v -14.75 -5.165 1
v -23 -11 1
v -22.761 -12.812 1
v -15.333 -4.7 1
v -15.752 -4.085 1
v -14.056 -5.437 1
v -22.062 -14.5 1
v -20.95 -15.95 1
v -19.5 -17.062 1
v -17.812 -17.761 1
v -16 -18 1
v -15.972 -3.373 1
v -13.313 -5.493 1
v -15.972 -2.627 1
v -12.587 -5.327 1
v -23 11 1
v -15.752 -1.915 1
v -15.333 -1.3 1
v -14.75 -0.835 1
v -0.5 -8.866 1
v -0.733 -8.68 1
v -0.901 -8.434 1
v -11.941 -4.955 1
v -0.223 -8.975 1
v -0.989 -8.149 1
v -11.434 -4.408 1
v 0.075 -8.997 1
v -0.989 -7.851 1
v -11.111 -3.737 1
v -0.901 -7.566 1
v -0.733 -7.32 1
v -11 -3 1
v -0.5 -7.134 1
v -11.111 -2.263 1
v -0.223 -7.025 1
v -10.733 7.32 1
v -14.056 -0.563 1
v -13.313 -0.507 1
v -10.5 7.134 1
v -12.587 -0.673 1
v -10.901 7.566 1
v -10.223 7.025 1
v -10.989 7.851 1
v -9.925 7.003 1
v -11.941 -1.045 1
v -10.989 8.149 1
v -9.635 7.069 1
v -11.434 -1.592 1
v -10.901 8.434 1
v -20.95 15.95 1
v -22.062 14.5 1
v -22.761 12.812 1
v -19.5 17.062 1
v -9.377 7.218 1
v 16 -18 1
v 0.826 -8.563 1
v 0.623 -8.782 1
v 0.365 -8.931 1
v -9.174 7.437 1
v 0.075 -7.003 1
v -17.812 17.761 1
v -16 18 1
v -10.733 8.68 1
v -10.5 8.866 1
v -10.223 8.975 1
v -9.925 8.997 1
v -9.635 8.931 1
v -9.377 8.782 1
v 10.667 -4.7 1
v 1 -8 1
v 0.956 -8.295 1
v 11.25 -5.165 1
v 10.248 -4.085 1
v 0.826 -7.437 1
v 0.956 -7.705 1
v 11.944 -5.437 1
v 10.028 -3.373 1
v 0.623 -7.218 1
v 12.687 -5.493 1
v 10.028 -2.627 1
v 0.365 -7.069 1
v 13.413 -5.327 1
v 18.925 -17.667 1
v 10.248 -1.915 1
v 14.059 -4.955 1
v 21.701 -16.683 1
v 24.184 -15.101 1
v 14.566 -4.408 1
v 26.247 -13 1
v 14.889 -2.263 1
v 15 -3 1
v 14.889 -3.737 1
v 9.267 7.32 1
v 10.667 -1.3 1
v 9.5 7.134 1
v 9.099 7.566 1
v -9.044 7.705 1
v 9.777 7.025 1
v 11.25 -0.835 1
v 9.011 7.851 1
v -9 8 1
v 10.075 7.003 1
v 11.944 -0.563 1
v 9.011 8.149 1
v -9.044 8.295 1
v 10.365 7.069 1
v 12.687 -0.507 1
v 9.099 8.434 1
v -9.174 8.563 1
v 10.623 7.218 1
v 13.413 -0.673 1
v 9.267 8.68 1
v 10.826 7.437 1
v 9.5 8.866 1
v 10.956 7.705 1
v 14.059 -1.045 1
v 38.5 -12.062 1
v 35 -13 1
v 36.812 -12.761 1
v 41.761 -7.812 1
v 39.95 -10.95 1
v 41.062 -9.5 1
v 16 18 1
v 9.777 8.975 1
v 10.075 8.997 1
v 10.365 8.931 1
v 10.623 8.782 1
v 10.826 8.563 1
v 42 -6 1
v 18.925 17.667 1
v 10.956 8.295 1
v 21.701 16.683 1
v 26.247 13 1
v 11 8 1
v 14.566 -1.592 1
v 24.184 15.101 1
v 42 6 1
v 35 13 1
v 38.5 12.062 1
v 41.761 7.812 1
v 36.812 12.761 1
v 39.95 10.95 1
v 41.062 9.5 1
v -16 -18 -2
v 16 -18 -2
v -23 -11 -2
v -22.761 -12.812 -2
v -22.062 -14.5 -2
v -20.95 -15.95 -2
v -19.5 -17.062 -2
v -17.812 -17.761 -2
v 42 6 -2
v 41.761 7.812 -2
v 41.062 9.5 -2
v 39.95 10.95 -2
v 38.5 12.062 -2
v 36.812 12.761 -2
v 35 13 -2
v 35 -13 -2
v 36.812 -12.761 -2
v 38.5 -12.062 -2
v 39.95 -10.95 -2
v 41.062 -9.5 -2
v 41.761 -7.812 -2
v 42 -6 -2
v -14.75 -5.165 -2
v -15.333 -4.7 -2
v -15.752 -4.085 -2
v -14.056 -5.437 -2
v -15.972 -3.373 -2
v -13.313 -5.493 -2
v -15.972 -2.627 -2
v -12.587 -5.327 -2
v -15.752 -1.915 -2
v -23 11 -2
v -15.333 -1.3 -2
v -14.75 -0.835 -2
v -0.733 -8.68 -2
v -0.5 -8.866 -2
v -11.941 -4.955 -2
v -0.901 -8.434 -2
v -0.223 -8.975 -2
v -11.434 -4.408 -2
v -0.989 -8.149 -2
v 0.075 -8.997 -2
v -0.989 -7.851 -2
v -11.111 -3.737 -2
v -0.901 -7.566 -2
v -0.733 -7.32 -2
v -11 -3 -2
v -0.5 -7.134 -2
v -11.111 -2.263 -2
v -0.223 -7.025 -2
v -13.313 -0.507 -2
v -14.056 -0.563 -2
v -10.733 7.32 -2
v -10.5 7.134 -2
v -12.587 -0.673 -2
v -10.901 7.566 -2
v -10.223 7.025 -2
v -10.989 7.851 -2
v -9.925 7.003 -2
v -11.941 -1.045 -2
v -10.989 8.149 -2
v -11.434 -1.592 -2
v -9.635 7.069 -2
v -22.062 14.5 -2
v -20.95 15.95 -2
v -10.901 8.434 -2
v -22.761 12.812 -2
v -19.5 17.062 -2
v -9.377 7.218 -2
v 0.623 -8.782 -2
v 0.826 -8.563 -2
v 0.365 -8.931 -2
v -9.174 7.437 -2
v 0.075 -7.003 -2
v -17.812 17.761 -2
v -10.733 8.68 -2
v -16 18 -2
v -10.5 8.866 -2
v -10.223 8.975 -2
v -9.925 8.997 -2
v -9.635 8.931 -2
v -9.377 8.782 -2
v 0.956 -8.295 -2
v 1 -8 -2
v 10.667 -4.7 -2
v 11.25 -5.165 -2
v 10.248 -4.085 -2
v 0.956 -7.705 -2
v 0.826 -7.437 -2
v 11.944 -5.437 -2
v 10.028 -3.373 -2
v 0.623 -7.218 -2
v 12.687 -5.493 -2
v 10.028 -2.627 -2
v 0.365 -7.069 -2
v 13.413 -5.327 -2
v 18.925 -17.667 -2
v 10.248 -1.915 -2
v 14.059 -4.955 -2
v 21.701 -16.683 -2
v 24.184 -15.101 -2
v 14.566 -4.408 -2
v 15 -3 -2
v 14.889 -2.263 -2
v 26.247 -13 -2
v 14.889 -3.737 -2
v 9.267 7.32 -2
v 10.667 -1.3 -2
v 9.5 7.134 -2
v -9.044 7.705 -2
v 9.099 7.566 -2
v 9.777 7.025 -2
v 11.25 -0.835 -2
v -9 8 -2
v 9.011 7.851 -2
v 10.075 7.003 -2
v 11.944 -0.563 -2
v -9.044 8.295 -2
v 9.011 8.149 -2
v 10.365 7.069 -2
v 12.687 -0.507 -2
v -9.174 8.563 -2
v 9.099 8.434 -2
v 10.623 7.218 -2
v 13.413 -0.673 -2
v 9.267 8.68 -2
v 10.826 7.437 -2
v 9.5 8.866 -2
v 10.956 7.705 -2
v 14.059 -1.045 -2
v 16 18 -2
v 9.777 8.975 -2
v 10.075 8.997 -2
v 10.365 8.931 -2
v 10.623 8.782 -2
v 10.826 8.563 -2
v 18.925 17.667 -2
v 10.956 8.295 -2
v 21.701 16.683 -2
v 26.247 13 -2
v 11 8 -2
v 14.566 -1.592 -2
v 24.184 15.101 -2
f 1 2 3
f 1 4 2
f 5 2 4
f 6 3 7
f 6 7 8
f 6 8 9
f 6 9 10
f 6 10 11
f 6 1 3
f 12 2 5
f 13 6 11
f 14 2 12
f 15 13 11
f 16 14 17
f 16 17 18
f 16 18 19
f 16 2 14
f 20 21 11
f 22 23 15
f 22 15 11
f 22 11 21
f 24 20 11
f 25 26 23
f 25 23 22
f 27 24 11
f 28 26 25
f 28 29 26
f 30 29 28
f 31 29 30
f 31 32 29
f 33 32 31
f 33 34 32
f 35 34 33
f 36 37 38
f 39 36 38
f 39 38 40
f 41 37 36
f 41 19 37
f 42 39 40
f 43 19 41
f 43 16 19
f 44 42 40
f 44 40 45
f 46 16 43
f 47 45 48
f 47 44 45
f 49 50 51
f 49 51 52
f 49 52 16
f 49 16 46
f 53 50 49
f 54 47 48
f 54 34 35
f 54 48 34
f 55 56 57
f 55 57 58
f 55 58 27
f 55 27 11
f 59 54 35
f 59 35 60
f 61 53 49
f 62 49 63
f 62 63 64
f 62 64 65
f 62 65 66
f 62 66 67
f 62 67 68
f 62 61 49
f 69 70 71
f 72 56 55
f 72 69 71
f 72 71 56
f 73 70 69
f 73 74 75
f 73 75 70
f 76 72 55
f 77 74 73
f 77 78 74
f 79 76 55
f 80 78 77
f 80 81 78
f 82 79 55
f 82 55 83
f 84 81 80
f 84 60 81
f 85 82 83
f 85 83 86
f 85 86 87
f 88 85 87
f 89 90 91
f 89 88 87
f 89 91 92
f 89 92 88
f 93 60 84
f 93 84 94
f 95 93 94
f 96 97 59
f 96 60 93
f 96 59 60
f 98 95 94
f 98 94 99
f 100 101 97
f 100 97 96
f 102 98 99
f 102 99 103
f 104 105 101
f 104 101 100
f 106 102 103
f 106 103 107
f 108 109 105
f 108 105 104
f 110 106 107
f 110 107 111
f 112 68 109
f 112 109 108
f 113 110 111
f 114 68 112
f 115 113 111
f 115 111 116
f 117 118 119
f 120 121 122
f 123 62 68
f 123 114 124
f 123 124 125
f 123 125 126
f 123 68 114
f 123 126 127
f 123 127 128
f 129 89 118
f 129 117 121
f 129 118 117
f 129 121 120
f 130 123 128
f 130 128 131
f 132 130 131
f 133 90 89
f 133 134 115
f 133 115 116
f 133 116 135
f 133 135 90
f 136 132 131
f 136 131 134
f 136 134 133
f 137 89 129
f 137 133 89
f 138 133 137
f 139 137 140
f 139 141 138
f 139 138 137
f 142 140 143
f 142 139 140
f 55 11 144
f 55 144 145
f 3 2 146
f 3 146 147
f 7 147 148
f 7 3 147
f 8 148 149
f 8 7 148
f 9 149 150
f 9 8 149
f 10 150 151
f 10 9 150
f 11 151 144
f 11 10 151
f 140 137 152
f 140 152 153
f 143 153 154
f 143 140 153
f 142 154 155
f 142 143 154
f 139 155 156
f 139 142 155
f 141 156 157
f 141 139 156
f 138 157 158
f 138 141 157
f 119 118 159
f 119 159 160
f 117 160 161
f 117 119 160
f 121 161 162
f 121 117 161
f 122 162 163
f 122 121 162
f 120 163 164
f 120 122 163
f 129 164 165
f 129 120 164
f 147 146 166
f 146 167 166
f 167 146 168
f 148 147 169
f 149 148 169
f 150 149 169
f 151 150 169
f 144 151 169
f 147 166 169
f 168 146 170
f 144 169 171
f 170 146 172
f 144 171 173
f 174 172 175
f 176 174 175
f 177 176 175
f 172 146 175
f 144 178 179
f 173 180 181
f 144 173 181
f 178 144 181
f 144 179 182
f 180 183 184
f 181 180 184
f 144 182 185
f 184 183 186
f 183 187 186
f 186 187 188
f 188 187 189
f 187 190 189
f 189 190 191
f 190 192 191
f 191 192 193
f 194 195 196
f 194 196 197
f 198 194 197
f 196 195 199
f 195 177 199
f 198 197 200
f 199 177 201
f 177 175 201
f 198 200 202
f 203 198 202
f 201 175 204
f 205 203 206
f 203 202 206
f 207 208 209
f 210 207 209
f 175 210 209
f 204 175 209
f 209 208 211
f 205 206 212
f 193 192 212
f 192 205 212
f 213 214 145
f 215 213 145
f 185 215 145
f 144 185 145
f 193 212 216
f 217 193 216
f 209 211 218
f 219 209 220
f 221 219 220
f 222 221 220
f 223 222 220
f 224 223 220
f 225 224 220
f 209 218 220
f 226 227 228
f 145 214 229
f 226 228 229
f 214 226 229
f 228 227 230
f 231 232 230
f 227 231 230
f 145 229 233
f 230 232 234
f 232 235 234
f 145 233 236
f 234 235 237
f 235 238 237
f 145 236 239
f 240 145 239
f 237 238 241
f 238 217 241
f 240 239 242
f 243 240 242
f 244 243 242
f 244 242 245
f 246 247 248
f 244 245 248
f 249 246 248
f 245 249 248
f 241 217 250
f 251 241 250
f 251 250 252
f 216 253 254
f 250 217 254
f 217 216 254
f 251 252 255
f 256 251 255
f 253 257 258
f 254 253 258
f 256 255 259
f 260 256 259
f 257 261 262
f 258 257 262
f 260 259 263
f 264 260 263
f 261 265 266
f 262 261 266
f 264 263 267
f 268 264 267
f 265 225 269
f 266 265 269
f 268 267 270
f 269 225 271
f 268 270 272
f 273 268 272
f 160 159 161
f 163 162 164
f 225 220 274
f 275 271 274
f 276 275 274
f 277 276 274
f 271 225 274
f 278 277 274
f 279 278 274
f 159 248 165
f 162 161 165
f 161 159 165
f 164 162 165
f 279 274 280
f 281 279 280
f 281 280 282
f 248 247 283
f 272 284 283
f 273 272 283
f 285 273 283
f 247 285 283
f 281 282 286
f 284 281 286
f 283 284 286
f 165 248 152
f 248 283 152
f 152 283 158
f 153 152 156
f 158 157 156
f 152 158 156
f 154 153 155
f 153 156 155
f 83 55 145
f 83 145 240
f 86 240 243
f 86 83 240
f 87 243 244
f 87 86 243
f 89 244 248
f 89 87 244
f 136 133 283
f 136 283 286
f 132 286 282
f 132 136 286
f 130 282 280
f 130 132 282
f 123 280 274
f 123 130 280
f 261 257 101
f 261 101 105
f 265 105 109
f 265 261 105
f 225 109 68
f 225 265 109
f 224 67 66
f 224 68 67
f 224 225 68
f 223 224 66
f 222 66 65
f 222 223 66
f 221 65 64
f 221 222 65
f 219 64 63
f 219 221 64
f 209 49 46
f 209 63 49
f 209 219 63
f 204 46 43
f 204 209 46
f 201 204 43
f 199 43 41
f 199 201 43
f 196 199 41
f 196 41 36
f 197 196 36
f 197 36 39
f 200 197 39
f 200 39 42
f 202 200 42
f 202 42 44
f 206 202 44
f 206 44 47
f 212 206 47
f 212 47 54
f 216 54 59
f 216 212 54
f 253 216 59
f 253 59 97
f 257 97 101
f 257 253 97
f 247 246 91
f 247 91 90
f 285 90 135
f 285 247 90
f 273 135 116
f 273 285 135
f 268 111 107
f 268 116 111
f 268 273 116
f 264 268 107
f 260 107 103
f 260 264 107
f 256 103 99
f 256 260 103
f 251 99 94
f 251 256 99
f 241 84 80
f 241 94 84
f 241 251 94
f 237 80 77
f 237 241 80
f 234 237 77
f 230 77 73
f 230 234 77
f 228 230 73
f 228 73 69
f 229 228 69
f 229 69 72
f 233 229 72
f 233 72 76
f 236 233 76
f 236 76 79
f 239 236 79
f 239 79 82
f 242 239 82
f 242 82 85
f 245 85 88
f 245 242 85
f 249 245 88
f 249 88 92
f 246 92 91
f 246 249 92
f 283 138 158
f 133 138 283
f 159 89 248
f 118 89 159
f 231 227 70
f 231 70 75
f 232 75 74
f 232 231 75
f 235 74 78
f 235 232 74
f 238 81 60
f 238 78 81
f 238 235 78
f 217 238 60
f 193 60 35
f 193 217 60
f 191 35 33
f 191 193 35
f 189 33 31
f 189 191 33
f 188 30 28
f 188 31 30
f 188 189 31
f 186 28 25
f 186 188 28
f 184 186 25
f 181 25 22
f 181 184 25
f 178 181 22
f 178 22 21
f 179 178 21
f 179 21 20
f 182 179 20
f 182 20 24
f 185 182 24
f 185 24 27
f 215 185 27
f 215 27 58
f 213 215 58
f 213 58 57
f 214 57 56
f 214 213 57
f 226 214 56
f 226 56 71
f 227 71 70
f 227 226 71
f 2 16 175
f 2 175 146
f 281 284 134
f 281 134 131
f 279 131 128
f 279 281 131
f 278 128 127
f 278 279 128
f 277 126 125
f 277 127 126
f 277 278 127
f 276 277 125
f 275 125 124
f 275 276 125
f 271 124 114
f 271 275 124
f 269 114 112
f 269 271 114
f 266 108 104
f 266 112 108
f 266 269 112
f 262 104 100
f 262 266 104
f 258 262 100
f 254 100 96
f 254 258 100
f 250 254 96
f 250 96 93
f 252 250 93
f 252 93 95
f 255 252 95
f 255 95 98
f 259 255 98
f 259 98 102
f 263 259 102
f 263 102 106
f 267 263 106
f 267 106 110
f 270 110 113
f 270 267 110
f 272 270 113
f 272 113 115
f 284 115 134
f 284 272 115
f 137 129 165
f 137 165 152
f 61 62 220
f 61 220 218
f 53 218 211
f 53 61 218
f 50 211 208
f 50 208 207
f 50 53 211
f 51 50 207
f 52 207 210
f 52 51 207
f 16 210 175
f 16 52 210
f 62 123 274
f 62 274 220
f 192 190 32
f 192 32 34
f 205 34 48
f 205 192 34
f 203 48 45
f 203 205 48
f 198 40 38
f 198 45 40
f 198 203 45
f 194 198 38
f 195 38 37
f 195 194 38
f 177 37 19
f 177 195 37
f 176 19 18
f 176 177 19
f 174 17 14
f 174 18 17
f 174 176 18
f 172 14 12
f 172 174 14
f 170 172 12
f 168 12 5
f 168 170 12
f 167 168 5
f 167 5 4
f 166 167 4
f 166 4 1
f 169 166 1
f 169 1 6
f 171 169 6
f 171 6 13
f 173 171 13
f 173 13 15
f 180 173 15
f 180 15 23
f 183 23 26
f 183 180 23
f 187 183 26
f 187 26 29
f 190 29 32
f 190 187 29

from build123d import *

# Parameters (mm, degrees)
INSERT_IN_SHEET_METAL_HOLE_DEPTH = 1
BACKING_DEPTH                    = 3
SCREWHOLES_DEPTH                 = 46.793012567
SCREWHOLES_DEPTH_BACK            = 46.793012567
SKETCH3_R                        = 1
WIRE_HOLES_DEPTH                 = 46.793012567
WIRE_HOLES_DEPTH_BACK            = 46.793012567
SKETCH4_R                        = 2.5


with BuildPart() as part:
    # Sketch1 → Insert in sheet metal hole (new body)
    with BuildSketch(Plane.XY):
        with BuildLine():
            Line((-18, 11), (-18, -11))
            ThreePointArc((-18, -11), (-17.414213562, -12.414213562), (-16, -13))
            Line((-16, -13), (16, -13))
            ThreePointArc((16, -13), (20, -11.92820323), (22.92820323, -9))
            ThreePointArc((22.92820323, -9), (23.660254038, -8.267949192), (24.660254038, -8))
            Line((24.660254038, -8), (35, -8))
            ThreePointArc((35, -8), (36.414213562, -7.414213562), (37, -6))
            Line((37, -6), (37, 6))
            ThreePointArc((37, 6), (36.414213562, 7.414213562), (35, 8))
            Line((35, 8), (24.660254038, 8))
            ThreePointArc((24.660254038, 8), (23.660254038, 8.267949192), (22.92820323, 9))
            ThreePointArc((22.92820323, 9), (20, 11.92820323), (16, 13))
            Line((16, 13), (-16, 13))
            ThreePointArc((-16, 13), (-17.414213562, 12.414213562), (-18, 11))
        make_face()
    extrude(amount=INSERT_IN_SHEET_METAL_HOLE_DEPTH)

    # Sketch2 → Backing (add)
    with BuildSketch(Plane.XY.offset(1)):
        with BuildLine():
            Line((26.246950766, -13), (35, -13))
            ThreePointArc((35, -13), (39.949747468, -10.949747468), (42, -6))
            Line((42, -6), (42, 6))
            ThreePointArc((42, 6), (39.949747468, 10.949747468), (35, 13))
            Line((35, 13), (26.246950766, 13))
            ThreePointArc((26.246950766, 13), (21.700877125, 16.683321446), (16, 18))
            Line((16, 18), (-16, 18))
            ThreePointArc((-16, 18), (-20.949747468, 15.949747468), (-23, 11))
            Line((-23, 11), (-23, -11))
            ThreePointArc((-23, -11), (-20.949747468, -15.949747468), (-16, -18))
            Line((-16, -18), (16, -18))
            ThreePointArc((16, -18), (21.700877125, -16.683321446), (26.246950766, -13))
        make_face()
    extrude(amount=-BACKING_DEPTH)

    # Sketch3 → Screwholes (cut, two sides: drawn at the far end of the back side and taken through both)
    with BuildSketch(Plane.XY.offset(1).offset(-SCREWHOLES_DEPTH_BACK)):
        with Locations((-10, 8)):
            Circle(SKETCH3_R)
        with Locations((10, 8)):
            Circle(SKETCH3_R)
        with Locations((0, -8)):
            Circle(SKETCH3_R)
    extrude(amount=SCREWHOLES_DEPTH + SCREWHOLES_DEPTH_BACK, mode=Mode.SUBTRACT)

    # Sketch4 → Wire holes (cut, two sides: drawn at the far end of the back side and taken through both)
    with BuildSketch(Plane.XY.offset(1).offset(-WIRE_HOLES_DEPTH_BACK)):
        with Locations((-13.5, -3)):
            Circle(SKETCH4_R)
        with Locations((12.5, -3)):
            Circle(SKETCH4_R)
    extrude(amount=WIRE_HOLES_DEPTH + WIRE_HOLES_DEPTH_BACK, mode=Mode.SUBTRACT)


solid = part.part
